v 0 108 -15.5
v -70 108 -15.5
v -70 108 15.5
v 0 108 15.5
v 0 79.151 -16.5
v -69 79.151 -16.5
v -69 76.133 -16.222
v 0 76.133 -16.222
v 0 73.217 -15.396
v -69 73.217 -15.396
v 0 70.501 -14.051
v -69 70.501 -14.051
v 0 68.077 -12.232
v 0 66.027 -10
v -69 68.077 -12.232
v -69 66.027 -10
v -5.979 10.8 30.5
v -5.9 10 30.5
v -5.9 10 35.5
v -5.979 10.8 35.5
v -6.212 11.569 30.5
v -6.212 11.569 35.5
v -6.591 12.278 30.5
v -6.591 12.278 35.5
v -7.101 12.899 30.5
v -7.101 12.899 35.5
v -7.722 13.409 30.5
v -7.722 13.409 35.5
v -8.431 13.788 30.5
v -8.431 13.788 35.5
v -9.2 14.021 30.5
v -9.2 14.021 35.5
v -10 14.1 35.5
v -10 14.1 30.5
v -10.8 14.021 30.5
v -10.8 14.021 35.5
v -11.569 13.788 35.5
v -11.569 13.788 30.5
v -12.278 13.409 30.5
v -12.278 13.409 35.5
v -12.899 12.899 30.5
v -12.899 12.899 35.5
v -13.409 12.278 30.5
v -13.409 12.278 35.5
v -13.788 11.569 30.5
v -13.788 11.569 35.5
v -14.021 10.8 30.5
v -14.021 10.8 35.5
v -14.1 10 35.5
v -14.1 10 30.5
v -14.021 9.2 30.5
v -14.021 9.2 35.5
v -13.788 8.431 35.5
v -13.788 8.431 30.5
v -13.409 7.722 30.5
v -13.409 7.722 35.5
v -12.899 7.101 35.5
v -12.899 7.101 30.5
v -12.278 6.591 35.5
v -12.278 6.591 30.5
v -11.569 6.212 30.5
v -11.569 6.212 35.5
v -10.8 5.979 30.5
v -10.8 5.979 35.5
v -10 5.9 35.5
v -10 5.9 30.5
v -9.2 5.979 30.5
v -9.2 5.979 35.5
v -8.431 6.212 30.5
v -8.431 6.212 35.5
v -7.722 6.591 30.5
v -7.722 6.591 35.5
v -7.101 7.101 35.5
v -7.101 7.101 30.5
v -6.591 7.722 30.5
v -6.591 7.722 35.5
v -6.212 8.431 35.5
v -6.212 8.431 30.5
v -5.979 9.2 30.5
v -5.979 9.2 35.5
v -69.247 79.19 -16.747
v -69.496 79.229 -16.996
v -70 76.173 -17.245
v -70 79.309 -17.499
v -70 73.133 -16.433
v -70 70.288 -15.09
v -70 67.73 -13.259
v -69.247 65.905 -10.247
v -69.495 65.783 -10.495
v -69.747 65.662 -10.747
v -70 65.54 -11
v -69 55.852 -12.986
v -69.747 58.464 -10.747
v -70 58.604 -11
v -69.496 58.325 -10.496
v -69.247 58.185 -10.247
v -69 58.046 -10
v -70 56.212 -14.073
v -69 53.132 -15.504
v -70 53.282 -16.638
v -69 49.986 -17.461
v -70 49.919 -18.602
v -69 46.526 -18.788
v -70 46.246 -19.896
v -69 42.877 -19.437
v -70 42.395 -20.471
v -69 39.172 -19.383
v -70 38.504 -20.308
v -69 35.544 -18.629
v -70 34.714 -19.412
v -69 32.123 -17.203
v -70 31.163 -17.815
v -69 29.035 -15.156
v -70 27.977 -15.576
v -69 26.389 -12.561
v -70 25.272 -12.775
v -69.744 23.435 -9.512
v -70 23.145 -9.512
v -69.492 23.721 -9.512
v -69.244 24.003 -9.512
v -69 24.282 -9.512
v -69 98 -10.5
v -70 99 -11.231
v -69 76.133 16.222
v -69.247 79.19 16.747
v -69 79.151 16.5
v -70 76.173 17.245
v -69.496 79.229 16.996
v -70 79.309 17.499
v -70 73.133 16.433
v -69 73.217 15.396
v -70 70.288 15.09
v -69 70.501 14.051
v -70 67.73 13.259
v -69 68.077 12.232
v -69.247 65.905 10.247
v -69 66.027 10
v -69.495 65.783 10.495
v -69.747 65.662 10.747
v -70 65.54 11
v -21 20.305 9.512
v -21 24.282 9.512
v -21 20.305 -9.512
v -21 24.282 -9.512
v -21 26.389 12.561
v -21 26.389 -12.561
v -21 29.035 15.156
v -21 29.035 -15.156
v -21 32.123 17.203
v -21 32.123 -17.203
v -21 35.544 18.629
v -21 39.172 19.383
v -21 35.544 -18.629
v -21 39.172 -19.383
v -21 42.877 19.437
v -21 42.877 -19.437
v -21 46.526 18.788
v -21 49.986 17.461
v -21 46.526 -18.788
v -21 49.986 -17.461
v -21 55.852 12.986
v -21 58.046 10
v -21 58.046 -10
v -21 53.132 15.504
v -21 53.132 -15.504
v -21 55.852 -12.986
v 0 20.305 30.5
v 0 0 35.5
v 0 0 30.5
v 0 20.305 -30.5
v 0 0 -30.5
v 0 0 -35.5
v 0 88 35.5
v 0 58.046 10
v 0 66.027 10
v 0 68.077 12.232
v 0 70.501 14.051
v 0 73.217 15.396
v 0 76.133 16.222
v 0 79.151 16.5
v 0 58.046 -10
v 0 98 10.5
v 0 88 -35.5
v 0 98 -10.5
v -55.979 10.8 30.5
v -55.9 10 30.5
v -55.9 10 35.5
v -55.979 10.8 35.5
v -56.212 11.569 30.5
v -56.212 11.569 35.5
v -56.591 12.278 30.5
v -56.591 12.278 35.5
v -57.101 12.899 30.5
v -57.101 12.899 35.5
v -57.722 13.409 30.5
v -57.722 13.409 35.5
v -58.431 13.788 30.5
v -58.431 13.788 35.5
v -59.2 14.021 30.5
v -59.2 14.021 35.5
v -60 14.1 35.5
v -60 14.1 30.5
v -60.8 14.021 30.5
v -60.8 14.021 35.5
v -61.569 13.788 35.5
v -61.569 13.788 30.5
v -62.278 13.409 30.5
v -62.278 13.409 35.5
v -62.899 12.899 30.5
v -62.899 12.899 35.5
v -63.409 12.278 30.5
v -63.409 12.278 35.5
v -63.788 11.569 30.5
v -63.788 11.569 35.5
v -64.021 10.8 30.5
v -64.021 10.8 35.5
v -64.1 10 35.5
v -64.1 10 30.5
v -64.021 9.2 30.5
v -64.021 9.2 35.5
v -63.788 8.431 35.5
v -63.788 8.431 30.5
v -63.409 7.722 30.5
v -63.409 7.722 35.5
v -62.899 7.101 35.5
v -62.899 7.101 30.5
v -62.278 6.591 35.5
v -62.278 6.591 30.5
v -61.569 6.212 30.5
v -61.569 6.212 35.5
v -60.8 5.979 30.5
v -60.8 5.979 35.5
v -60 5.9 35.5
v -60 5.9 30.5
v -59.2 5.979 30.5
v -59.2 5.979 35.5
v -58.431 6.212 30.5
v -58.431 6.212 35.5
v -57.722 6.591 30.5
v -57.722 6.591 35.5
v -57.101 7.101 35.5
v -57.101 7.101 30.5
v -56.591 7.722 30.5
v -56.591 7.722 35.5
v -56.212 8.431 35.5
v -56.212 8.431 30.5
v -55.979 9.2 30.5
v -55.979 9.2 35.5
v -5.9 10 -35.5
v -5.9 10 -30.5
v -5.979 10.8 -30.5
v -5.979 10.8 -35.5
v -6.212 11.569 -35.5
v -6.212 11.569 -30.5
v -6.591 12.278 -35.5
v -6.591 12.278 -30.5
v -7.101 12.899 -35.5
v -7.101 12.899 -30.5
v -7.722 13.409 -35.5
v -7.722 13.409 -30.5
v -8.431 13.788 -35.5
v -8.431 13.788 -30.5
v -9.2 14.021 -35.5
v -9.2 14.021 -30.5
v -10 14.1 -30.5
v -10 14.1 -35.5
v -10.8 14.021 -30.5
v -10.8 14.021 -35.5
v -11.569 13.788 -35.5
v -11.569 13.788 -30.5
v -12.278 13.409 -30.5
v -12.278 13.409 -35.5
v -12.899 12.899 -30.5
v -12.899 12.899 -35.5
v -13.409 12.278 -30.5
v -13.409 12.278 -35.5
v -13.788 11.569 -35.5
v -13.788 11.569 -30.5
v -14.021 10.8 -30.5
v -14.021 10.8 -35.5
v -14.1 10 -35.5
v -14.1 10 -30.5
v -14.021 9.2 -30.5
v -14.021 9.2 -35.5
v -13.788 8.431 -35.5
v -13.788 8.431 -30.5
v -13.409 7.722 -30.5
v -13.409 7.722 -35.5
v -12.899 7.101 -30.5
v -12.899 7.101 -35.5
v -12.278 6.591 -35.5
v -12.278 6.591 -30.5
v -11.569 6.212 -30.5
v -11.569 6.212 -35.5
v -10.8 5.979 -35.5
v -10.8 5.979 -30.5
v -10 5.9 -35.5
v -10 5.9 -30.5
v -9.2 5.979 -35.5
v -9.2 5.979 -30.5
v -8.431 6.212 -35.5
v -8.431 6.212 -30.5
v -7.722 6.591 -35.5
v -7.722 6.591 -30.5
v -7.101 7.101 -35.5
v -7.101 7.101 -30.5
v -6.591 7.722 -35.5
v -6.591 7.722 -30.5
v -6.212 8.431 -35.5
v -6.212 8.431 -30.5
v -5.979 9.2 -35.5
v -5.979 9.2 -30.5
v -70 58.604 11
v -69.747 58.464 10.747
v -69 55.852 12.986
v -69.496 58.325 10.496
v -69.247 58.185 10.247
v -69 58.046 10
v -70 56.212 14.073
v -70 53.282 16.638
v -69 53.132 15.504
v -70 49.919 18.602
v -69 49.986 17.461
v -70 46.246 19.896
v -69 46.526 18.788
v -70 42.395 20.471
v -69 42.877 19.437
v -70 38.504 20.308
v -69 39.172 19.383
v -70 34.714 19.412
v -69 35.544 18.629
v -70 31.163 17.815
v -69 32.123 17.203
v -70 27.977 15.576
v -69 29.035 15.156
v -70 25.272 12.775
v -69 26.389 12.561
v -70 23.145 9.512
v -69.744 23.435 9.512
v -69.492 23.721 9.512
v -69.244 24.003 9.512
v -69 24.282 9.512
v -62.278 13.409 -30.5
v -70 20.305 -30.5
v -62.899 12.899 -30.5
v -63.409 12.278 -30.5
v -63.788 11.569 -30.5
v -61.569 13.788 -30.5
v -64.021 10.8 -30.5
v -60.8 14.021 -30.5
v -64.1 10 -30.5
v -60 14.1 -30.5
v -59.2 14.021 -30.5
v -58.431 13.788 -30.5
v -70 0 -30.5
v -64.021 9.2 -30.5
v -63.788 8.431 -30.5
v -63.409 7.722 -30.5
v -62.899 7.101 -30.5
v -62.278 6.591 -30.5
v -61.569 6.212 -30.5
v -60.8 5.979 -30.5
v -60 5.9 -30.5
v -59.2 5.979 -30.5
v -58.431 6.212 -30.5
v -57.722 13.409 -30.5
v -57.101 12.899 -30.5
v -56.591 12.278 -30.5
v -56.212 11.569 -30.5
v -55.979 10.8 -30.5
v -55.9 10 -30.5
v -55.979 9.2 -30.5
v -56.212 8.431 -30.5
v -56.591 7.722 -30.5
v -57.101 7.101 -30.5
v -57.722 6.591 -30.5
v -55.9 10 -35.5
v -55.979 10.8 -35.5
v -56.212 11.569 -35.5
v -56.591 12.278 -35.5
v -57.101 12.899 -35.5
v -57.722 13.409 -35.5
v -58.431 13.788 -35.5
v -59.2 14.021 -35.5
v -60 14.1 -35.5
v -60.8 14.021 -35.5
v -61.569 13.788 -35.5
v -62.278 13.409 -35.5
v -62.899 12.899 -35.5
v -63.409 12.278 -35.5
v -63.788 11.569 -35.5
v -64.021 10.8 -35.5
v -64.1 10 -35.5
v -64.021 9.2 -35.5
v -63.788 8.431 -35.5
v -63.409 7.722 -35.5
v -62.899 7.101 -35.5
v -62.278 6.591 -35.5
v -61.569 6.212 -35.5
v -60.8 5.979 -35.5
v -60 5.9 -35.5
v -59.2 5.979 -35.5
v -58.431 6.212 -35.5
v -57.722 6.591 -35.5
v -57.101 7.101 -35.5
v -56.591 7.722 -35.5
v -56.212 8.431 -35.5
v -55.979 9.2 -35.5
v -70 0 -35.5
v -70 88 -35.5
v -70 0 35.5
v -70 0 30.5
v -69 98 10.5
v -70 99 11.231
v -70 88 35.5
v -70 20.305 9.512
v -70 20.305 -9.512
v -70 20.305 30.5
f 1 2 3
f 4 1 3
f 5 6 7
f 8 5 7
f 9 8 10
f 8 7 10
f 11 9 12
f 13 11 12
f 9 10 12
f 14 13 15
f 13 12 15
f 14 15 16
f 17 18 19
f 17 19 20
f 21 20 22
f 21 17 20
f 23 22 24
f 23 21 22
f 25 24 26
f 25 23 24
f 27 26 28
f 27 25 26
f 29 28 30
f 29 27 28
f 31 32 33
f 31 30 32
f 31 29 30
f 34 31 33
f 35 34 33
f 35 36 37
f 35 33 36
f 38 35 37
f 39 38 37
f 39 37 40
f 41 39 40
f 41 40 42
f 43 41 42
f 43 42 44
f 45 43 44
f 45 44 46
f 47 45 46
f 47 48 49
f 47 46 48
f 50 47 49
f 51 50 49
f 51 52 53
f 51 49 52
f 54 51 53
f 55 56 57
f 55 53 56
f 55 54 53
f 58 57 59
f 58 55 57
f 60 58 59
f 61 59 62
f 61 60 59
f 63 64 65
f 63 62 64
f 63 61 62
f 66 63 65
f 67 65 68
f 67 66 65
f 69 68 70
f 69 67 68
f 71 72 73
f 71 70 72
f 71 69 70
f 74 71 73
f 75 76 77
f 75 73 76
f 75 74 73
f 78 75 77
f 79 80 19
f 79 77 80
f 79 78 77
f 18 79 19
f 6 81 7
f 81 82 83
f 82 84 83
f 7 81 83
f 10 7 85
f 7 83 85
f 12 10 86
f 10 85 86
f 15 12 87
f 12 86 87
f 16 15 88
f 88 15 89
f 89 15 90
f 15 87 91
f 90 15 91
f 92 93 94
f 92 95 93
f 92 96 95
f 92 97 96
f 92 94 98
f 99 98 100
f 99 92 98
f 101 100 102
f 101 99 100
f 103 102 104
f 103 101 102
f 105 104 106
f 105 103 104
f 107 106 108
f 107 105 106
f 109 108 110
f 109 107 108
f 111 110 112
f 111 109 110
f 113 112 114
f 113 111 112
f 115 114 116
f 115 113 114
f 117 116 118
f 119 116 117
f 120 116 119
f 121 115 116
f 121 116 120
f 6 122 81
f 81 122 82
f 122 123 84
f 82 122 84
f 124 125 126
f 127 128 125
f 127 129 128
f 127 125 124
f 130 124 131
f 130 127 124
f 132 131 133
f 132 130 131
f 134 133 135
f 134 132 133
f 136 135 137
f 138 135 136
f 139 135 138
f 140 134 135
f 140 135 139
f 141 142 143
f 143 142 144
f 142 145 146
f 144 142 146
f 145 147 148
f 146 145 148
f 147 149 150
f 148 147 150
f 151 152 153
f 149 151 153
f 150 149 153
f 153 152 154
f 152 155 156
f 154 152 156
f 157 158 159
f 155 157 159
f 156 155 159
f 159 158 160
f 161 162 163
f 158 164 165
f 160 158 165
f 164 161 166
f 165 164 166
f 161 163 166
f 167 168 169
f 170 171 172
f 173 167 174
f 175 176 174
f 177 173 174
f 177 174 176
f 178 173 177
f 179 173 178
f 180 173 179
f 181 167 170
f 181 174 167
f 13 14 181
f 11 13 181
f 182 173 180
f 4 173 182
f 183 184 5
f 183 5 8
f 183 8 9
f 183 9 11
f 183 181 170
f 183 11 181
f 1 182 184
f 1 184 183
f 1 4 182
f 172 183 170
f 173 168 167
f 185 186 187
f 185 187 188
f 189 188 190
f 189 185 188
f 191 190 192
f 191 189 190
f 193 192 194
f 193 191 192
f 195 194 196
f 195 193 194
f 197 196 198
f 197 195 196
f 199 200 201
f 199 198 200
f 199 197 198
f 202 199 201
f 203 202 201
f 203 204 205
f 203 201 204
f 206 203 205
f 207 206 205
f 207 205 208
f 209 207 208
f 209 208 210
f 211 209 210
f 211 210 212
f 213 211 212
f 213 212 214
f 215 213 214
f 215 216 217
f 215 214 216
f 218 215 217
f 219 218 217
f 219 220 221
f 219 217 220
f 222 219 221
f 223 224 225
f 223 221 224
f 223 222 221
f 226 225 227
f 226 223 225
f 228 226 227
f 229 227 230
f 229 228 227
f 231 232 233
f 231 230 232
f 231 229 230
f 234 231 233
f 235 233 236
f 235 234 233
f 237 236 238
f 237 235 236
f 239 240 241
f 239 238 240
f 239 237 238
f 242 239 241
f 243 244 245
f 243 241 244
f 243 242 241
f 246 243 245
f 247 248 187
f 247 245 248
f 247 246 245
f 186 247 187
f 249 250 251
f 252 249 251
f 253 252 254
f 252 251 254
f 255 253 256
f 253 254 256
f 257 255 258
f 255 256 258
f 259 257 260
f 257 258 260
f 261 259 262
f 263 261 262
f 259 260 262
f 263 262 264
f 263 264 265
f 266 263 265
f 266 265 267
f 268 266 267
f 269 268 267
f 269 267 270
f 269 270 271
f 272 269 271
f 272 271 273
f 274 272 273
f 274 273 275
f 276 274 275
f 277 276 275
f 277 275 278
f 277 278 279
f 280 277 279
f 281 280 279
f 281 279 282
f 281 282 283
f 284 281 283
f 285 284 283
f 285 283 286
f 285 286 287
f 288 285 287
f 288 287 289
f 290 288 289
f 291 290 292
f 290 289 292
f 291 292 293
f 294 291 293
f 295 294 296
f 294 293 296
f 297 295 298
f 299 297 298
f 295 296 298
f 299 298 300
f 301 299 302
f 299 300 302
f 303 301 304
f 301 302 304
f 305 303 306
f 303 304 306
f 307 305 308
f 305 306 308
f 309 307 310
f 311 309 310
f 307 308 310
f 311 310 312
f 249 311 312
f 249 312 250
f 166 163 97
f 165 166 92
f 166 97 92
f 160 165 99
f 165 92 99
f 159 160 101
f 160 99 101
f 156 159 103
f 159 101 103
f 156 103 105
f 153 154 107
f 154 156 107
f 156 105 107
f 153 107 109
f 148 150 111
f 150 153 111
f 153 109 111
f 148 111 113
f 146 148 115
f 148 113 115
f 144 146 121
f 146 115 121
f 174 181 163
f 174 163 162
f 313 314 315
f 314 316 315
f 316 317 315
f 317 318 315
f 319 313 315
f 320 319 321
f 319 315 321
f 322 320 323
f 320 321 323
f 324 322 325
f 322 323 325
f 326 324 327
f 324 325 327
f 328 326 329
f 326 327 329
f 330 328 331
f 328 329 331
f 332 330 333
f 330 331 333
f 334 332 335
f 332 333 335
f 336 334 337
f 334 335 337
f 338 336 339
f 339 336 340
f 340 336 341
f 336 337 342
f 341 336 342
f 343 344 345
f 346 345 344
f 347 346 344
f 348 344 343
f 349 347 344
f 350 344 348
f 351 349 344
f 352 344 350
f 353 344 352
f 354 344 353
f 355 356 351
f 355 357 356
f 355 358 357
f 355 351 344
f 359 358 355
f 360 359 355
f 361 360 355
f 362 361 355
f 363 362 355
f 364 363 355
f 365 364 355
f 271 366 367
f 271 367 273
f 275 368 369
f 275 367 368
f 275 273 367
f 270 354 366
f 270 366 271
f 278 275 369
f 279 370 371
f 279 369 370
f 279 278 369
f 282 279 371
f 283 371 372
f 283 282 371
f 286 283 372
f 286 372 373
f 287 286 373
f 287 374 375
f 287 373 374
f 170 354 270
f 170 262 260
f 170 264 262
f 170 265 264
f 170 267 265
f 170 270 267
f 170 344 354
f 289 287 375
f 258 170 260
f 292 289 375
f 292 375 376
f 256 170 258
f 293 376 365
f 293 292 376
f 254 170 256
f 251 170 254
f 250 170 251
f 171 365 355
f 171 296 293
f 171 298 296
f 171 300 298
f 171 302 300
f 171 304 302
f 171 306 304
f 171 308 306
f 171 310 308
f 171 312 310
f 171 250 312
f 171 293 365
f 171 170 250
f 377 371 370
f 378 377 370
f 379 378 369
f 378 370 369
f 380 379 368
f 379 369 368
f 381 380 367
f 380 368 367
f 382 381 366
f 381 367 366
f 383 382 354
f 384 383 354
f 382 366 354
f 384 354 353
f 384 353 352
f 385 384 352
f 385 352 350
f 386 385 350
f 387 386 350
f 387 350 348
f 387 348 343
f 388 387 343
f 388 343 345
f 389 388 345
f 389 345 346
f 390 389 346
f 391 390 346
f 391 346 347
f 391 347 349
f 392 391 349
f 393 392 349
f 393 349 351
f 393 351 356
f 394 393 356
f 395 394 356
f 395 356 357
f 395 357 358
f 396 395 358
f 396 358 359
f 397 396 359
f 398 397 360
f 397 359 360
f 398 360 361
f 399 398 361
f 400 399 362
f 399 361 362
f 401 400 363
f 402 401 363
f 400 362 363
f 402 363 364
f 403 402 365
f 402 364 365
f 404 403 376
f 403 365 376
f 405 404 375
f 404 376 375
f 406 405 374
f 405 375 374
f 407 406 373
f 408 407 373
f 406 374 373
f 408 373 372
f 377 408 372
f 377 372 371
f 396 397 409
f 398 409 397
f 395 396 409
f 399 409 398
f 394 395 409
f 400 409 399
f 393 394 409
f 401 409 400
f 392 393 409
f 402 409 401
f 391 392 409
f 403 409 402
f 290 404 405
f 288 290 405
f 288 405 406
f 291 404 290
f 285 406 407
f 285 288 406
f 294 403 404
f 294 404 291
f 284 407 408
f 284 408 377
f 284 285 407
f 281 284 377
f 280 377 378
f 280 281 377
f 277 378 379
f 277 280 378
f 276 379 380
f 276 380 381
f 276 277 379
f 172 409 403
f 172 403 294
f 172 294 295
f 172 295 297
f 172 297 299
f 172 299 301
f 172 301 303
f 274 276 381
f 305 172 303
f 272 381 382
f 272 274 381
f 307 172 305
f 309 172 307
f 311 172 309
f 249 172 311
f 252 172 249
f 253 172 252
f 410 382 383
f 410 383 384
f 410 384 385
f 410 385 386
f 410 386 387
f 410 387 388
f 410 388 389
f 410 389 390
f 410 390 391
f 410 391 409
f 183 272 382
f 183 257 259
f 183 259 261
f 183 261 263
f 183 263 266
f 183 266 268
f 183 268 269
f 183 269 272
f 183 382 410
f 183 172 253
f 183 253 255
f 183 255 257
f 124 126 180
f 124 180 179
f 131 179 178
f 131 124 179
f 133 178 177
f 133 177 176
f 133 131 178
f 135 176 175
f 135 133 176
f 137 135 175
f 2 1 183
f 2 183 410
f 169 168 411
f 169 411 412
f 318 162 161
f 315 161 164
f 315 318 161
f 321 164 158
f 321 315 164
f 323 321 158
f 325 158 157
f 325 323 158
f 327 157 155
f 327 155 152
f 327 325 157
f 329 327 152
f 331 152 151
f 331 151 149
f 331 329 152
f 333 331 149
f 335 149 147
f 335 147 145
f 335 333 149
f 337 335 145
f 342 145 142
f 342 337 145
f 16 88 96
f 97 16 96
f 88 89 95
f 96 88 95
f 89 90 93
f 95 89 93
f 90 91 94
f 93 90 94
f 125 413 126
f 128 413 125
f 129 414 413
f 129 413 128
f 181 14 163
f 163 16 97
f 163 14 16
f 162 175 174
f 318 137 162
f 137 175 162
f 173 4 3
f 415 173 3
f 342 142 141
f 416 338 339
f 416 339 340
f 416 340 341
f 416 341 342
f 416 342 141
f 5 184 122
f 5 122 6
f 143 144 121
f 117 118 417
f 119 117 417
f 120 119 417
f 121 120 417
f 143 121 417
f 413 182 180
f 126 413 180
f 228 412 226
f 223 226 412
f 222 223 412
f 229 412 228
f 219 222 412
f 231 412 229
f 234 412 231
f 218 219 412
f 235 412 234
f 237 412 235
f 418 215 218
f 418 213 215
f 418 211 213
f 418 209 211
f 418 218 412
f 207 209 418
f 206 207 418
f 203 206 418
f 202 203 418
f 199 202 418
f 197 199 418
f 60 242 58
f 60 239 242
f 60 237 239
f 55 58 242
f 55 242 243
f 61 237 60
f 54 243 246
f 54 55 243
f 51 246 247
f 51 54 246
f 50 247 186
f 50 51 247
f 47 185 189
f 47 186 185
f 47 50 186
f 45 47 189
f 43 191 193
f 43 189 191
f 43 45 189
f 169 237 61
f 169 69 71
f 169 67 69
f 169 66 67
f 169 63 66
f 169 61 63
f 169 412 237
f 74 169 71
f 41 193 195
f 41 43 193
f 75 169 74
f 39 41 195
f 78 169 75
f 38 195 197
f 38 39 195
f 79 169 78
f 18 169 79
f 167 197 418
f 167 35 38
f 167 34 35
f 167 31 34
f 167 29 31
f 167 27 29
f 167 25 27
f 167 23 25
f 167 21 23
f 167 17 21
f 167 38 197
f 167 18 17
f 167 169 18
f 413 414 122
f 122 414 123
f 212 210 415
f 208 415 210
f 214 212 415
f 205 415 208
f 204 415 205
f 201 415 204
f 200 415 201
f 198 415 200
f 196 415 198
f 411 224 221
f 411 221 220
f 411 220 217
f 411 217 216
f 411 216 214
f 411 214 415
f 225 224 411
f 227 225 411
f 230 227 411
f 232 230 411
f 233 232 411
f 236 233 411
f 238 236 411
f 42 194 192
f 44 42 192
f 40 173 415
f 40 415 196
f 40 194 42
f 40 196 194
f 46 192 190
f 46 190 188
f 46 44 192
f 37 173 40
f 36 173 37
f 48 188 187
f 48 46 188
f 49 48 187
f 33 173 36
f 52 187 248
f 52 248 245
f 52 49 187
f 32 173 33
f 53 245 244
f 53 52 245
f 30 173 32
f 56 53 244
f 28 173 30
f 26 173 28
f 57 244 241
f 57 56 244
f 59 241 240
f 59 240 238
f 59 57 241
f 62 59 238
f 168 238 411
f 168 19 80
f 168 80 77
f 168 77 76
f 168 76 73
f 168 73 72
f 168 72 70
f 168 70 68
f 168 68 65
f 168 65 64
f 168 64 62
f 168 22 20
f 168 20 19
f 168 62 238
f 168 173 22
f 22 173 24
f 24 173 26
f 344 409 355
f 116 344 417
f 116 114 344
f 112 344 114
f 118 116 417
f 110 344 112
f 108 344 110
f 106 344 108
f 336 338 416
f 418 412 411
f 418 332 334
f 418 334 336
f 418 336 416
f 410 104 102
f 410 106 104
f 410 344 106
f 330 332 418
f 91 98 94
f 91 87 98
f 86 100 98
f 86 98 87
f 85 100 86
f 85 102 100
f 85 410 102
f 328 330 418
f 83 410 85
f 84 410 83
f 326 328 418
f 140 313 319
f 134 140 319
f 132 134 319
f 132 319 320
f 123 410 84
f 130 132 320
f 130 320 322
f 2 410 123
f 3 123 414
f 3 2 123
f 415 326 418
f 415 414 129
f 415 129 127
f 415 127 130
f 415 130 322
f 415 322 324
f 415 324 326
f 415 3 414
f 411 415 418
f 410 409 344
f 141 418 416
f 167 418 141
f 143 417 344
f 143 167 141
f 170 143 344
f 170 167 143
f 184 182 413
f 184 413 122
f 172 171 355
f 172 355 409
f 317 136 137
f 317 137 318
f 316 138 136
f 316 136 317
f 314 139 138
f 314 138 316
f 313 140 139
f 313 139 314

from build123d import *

# Parameters (mm, degrees)
BOSS_EXTRUDE1_DEPTH     = 70
SKETCH3_R               = 4.1
CUT_EXTRUDE2_DEPTH      = 36.5
CUT_EXTRUDE2_DEPTH_BACK = 36.5
BOSS_EXTRUDE2_DEPTH     = 70
BOSS_EXTRUDE5_DEPTH     = 70
BOSS_EXTRUDE6_DEPTH     = 21
CHAMFER1_SIZE           = 20
CHAMFER4_SIZE           = 1


with BuildPart() as part:
    # Sketch1 → Boss-Extrude1 (new body)
    with BuildSketch(Plane(origin=(0, 0, 0), x_dir=(0, 0, -1), z_dir=(1, 0, 0))):
        Polygon((-30.5, 0), (-30.5, 20), (-30.5, 98), (30.5, 98), (30.5, 0), (35.5, 0), (35.5, 108), (-35.5, 108), (-35.5, 0), align=None)
    extrude(amount=-BOSS_EXTRUDE1_DEPTH)

    # Sketch3 → Cut-Extrude2 (cut, two sides)
    with BuildSketch(Plane.XY) as cut_extrude2_sk:
        with Locations((-60, 10)):
            Circle(SKETCH3_R)
        with Locations((-10, 10)):
            Circle(SKETCH3_R)
    extrude(amount=CUT_EXTRUDE2_DEPTH, mode=Mode.SUBTRACT)
    extrude(cut_extrude2_sk.sketch, amount=-CUT_EXTRUDE2_DEPTH_BACK, mode=Mode.SUBTRACT)

    # Sketch4 → Boss-Extrude2 (add)
    with BuildSketch(Plane(origin=(0, 0, 0), x_dir=(0, 0, -1), z_dir=(1, 0, 0))):
        Polygon((-30.5, 98), (-10.5, 98), (-16.5, 79.151), (-30.5, 79.151), align=None)
    boss_extrude2 = extrude(amount=-BOSS_EXTRUDE2_DEPTH)

    # Mirror2: Boss-Extrude2 across plane
    add(boss_extrude2.mirror(Plane.XY))

    # Sketch5 → Boss-Extrude5 (add)
    with BuildSketch(Plane.ZY.offset(70)):
        with BuildLine():
            Line((-30.5, 62.151), (-30.5, 79.151))
            Line((-30.5, 79.151), (-16.5, 79.151))
            ThreePointArc((-16.5, 79.151), (-14.785973083, 71.828090742), (-10, 66.026595252))
            Line((-10, 66.026595252), (-10, 62.151))
            Line((-10, 62.151), (-10, 58.045669043))
            ThreePointArc((-10, 58.045669043), (-19.497965112, 41.023297158), (-9.512195122, 24.282422523))
            Line((-9.512195122, 24.282422523), (-9.512195122, 20.305))
            Line((-9.512195122, 20.305), (-30.5, 20.305))
            Line((-30.5, 20.305), (-30.5, 41.305))
            Line((-30.5, 41.305), (-30.5, 62.151))
        make_face()
    boss_extrude5 = extrude(amount=-BOSS_EXTRUDE5_DEPTH)

    # Mirror3: Boss-Extrude5 across plane
    add(boss_extrude5.mirror(Plane.XY))

    # Sketch6 → Boss-Extrude6 (add)
    with BuildSketch(Plane(origin=(0, 0, 0), x_dir=(0, 0, -1), z_dir=(1, 0, 0))):
        with BuildLine():
            Line((-9.512195122, 20.305), (9.512195122, 20.305))
            Line((9.512195122, 20.305), (9.512195122, 24.282422523))
            ThreePointArc((9.512195122, 24.282422523), (19.497965112, 41.023297158), (10, 58.045669043))
            Line((10, 58.045669043), (-10, 58.045669043))
            ThreePointArc((-10, 58.045669043), (-19.497965112, 41.023297158), (-9.512195122, 24.282422523))
            Line((-9.512195122, 24.282422523), (-9.512195122, 20.305))
        make_face()
    extrude(amount=-BOSS_EXTRUDE6_DEPTH)

    # Mirror1: Boss-Extrude2 across plane
    add(boss_extrude2.mirror(Plane.XY))

    # Chamfer1
    chamfer1_edges = [part.edges().sort_by_distance(p)[0] for p in [
        (-35, 108, 35.5),
        (-35, 108, -35.5),
    ]]
    chamfer(chamfer1_edges, length=CHAMFER1_SIZE)

    # Chamfer4
    chamfer4_edges = [part.edges().sort_by_distance(p)[0] for p in [
        (-70, 41.023297158, 19.497965112),
        (-70, 62.036132147, 10),
        (-70, 71.828090742, 14.785973083),
        (-70, 98, 0),
        (-70, 88.5755, 13.5),
        (-70, 88.5755, -13.5),
        (-70, 41.023297158, -19.497965112),
        (-70, 62.036132147, -10),
        (-70, 71.828090742, -14.785973083),
    ]]
    chamfer(chamfer4_edges, length=CHAMFER4_SIZE)


solid = part.part
